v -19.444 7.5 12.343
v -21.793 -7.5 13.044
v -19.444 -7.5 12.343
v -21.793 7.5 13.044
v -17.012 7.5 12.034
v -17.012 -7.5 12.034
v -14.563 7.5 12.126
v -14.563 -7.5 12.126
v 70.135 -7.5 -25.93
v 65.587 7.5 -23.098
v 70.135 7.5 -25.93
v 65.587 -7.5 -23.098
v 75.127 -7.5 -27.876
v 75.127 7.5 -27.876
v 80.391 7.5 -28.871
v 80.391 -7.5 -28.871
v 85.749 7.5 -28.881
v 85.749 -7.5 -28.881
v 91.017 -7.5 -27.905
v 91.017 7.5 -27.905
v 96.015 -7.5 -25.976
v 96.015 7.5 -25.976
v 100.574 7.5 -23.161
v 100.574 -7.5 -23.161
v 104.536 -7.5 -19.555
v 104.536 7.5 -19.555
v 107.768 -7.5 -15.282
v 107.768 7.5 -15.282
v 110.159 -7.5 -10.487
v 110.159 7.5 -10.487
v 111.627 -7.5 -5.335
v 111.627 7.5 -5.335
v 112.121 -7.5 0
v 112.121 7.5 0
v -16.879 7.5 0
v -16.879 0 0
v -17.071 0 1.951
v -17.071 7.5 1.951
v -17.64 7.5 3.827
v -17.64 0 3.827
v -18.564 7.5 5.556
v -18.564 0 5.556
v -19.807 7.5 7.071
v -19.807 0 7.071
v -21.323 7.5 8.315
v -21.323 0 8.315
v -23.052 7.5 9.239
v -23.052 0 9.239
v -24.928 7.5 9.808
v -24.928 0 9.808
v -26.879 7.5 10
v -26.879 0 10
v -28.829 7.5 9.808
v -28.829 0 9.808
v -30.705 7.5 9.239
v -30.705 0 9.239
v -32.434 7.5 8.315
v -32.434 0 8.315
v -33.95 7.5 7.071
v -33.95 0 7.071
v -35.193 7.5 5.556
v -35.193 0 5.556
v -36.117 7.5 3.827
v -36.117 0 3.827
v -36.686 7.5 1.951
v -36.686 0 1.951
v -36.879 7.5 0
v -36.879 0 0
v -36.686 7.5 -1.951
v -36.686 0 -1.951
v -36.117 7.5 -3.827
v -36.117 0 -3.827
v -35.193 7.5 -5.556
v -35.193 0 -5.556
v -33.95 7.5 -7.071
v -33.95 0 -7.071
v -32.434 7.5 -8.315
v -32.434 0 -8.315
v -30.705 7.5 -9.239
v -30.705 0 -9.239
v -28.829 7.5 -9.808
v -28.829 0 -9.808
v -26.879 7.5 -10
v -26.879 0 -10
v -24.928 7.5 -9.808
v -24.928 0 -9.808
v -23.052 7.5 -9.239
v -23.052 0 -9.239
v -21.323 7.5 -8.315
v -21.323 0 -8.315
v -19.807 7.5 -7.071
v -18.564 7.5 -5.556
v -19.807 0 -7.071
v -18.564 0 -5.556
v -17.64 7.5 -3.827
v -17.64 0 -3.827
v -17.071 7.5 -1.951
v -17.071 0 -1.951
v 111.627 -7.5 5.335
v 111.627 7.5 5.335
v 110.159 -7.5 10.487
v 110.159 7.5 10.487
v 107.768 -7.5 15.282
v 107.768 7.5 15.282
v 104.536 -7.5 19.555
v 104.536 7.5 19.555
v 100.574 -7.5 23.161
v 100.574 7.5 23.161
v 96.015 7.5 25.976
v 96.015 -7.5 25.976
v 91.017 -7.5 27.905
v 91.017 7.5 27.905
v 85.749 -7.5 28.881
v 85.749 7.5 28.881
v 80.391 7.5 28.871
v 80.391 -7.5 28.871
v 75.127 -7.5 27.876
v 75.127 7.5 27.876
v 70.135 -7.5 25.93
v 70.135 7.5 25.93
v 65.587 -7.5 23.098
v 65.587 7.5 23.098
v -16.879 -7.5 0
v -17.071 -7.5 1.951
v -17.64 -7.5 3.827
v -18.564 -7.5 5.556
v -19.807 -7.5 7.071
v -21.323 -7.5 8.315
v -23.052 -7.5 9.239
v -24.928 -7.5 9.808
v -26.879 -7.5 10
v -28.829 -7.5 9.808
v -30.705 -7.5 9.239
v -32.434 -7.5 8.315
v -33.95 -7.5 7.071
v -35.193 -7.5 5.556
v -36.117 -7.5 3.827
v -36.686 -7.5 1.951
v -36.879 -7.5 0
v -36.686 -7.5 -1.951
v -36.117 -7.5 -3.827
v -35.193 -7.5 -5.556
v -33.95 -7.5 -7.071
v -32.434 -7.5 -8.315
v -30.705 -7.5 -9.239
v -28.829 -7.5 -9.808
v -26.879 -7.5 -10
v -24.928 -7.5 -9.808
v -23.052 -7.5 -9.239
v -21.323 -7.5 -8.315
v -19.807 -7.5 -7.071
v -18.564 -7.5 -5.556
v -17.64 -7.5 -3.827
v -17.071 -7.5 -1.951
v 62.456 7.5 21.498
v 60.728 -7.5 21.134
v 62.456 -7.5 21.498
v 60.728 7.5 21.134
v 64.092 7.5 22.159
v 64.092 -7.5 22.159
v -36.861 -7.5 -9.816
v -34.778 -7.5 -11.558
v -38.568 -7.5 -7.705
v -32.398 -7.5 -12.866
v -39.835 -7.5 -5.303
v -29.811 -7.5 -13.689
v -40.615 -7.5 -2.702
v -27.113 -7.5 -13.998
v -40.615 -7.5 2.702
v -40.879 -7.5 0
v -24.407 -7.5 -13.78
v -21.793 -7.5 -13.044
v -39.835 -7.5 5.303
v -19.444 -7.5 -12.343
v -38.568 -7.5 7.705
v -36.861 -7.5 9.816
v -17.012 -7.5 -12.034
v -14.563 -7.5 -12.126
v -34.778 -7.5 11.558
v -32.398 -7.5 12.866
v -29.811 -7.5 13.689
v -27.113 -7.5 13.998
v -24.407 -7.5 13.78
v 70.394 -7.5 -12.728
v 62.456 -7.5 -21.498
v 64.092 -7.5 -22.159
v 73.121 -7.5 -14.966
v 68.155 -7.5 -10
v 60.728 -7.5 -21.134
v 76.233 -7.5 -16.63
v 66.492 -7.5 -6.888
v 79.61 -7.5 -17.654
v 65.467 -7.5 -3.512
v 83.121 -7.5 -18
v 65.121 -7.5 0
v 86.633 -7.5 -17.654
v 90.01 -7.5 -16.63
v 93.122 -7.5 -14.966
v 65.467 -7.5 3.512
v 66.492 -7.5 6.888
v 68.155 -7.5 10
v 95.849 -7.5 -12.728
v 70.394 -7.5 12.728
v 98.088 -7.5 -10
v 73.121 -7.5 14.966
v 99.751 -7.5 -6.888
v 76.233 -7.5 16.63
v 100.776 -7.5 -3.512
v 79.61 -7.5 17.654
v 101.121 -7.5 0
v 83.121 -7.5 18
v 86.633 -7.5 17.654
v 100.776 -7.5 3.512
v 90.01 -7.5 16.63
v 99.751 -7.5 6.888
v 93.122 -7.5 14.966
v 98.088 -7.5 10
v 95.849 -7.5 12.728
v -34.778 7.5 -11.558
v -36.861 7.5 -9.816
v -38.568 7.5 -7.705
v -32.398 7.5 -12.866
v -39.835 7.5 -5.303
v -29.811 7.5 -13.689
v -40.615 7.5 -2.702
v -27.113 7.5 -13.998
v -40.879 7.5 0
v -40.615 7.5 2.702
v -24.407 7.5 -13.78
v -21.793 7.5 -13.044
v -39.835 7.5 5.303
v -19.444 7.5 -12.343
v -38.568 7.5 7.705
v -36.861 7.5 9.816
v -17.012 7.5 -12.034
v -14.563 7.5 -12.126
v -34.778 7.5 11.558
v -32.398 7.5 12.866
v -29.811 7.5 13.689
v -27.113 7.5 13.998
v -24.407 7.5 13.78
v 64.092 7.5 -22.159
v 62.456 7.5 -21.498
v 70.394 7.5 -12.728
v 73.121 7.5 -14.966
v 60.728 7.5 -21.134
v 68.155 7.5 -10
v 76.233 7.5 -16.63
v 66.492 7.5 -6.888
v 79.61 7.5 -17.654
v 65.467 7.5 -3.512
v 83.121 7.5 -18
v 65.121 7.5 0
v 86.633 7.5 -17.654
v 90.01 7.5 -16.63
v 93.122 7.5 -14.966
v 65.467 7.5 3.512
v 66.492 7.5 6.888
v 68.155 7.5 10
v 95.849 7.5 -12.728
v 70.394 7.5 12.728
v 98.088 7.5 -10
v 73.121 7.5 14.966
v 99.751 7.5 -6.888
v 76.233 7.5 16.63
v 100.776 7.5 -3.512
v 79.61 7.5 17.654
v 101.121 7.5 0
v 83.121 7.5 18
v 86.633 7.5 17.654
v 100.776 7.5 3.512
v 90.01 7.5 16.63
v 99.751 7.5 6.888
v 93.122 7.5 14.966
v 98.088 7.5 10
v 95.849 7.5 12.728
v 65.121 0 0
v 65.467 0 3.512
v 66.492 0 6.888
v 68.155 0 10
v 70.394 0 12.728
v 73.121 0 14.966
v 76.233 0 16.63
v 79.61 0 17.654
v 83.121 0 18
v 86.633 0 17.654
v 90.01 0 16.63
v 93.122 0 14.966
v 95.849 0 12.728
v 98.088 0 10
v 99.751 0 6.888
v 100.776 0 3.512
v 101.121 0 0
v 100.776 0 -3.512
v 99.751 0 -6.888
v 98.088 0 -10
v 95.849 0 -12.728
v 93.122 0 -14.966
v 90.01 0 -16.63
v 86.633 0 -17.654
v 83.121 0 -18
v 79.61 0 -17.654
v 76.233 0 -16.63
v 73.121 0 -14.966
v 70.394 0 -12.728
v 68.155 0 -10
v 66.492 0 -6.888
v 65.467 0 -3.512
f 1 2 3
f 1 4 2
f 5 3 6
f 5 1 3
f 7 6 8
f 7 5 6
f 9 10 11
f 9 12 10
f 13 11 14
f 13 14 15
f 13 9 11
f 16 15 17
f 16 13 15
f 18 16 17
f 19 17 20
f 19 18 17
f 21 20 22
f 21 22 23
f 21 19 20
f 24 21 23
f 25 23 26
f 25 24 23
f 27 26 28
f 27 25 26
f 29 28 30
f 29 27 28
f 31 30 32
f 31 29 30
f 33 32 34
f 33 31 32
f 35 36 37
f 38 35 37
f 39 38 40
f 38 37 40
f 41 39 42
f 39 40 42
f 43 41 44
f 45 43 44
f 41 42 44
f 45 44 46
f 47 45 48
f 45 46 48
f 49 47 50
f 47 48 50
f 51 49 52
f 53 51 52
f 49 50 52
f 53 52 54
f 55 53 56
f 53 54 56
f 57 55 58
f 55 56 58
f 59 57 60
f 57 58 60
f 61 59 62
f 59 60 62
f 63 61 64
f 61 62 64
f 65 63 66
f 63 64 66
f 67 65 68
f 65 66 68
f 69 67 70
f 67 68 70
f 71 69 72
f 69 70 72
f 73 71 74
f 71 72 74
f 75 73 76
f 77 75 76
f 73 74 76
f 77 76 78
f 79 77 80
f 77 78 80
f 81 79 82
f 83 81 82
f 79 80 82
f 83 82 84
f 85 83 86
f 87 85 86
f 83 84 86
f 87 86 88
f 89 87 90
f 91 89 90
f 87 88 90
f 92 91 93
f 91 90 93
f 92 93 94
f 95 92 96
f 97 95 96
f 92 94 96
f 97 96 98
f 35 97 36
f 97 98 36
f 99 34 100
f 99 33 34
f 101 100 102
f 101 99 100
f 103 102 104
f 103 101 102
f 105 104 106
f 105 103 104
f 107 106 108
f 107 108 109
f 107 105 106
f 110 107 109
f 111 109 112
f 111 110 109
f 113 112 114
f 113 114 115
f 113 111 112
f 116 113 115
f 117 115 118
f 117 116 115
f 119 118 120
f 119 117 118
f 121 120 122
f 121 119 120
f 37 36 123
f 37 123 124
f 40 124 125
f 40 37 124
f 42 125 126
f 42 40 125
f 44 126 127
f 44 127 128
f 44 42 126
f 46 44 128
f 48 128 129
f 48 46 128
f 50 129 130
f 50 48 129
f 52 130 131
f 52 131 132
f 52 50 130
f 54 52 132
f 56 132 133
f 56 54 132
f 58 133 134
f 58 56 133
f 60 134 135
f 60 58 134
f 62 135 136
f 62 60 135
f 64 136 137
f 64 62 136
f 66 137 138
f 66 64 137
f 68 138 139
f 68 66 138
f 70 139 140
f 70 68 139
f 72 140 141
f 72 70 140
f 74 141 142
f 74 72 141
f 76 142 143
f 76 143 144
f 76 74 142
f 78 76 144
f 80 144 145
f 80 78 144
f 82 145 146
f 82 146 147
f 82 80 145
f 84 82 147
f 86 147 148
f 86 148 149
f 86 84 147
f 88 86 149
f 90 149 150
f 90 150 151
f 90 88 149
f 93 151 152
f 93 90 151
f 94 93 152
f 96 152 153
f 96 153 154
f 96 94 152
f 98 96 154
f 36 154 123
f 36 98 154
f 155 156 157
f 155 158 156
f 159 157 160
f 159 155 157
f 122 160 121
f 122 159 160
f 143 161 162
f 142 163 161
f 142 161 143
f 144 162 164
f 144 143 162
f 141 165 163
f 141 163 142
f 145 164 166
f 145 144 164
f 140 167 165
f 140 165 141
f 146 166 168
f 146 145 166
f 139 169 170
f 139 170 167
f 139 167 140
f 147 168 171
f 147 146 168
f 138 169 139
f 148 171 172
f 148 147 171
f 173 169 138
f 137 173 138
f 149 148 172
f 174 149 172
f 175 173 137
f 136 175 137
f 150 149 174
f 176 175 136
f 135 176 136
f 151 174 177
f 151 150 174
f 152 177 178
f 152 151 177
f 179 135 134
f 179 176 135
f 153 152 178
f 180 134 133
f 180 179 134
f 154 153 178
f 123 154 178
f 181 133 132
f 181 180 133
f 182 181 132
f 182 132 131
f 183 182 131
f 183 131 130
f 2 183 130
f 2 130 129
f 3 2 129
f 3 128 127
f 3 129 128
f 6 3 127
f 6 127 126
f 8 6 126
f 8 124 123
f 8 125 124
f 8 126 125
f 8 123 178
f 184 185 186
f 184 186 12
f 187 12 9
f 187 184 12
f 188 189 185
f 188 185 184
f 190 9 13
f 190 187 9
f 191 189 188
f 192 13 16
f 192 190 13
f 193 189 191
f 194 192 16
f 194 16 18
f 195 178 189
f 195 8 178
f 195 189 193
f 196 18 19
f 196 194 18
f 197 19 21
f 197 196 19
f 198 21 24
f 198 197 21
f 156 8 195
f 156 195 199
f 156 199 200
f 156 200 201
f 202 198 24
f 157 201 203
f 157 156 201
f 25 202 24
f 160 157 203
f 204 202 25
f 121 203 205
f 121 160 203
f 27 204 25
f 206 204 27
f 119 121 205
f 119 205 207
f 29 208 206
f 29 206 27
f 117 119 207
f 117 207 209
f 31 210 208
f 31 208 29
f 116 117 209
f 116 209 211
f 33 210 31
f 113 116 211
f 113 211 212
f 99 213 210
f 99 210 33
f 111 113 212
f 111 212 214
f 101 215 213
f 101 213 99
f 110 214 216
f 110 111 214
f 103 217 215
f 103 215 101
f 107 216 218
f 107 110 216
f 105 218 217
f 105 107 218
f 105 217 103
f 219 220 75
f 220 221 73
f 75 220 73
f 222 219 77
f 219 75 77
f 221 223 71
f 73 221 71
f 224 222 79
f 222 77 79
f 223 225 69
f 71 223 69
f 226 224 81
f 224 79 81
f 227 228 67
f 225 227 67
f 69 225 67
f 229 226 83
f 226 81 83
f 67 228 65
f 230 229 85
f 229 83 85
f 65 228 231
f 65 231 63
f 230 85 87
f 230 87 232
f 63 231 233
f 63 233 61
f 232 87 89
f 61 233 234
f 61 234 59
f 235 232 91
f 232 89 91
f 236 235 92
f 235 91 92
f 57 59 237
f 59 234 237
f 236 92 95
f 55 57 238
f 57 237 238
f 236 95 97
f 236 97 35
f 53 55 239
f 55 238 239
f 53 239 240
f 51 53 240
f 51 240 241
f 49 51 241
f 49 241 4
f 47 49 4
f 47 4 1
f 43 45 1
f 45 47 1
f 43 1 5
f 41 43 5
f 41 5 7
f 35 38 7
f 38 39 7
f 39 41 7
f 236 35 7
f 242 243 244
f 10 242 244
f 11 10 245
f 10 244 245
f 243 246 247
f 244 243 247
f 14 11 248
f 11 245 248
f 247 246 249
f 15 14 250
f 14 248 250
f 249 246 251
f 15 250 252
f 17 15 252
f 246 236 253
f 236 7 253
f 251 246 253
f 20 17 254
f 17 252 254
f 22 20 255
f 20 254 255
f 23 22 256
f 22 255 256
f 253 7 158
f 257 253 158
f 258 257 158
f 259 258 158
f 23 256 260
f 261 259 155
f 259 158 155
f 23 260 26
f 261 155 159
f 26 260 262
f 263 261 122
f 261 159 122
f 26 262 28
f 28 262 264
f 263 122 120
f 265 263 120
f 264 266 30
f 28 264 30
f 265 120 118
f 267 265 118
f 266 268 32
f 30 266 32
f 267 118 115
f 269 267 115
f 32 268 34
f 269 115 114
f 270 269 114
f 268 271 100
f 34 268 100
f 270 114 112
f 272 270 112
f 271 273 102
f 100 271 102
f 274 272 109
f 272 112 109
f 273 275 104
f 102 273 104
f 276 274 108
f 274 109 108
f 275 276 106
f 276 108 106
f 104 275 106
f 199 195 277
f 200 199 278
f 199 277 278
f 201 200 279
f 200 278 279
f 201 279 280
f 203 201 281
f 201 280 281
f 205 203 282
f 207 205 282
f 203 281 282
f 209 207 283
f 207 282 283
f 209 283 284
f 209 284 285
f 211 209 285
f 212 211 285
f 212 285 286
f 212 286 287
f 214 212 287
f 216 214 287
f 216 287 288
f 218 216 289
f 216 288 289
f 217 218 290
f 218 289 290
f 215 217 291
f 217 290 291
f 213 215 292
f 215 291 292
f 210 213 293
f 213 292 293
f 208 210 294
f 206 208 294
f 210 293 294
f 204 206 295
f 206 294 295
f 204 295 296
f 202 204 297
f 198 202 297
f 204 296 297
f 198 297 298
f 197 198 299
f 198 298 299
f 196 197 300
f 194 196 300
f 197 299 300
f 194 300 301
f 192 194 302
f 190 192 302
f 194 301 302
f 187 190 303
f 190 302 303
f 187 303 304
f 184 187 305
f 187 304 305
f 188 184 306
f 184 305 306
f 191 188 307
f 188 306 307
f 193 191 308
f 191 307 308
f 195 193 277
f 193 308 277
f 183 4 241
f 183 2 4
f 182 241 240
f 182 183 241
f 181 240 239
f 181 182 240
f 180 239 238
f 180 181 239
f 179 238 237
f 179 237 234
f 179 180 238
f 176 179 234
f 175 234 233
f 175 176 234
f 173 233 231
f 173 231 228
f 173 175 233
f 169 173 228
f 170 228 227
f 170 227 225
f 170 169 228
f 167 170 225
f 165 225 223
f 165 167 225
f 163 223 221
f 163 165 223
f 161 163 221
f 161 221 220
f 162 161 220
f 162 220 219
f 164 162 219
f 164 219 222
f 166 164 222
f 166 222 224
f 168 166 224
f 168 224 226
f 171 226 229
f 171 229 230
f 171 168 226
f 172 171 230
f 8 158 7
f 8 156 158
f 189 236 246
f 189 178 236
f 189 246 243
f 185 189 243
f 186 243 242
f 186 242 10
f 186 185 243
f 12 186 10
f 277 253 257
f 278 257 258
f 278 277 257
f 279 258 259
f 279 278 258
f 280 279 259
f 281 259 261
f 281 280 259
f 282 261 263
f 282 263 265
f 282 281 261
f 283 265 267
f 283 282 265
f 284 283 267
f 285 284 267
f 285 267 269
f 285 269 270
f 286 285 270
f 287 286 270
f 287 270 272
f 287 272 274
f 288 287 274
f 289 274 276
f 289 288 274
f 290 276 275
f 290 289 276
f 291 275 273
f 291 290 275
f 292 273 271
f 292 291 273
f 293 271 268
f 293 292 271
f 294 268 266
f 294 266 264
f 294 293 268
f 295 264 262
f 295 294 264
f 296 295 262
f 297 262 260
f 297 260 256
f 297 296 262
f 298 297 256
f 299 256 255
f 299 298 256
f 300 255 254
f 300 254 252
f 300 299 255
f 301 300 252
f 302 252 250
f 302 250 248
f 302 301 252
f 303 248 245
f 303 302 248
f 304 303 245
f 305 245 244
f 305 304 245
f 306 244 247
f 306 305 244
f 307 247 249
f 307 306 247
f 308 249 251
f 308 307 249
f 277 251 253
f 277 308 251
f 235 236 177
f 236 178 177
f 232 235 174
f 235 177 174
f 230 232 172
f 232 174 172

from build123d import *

# Parameters (mm, degrees)
F0_R     = 10
F1_DEPTH = 7.5
F2_R     = 10
F3_R     = 10
F4_R     = 15
F5_R     = 15


with BuildPart() as f1:
    # F0 (on Front) → F1 (new body, symmetric)
    with BuildSketch(Plane.XZ):
        with BuildLine():
            ThreePointArc((-19.027325, -11.591323), (-14.510885, -6.560614), (-12.878518, 0))
            ThreePointArc((-12.878518, 0), (-14.510885, 6.560614), (-19.027325, 11.591323))
            ThreePointArc((-19.027325, 11.591323), (-40.878518, 0), (-19.027325, -11.591323))
        make_face()
        with Locations((-26.878518, 0)):
            Circle(F0_R, mode=Mode.SUBTRACT)
        with BuildLine():
            Line((54.121482, 0), (-12.878518, 0))
            ThreePointArc((-12.878518, 0), (-14.510885, -6.560614), (-19.027325, -11.591323))
            Line((-19.027325, -11.591323), (63.640685, -21.482518))
            ThreePointArc((63.640685, -21.482518), (56.607871, -11.748551), (54.121482, 0))
        make_face()
        with BuildLine():
            ThreePointArc((-19.027325, 11.591323), (-14.510885, 6.560614), (-12.878518, 0))
            Line((-12.878518, 0), (54.121482, 0))
            ThreePointArc((54.121482, 0), (56.607871, 11.748551), (63.640685, 21.482518))
            Line((63.640685, 21.482518), (-19.027325, 11.591323))
        make_face()
        with BuildLine():
            ThreePointArc((63.640685, 21.482518), (56.607871, 11.748551), (54.121482, 0))
            ThreePointArc((54.121482, 0), (56.607871, -11.748551), (63.640685, -21.482518))
            ThreePointArc((63.640685, -21.482518), (94.870033, -26.513611), (112.121482, 0))
            ThreePointArc((112.121482, 0), (94.870033, 26.513611), (63.640685, 21.482518))
        make_face()
        with BuildLine():
            ThreePointArc((101.121482, 0), (83.121482, -18), (65.121482, 0))
            ThreePointArc((65.121482, 0), (83.121482, 18), (101.121482, 0))
        make_face(mode=Mode.SUBTRACT)
    extrude(amount=F1_DEPTH, both=True)

    # F2
    f2_edges = [f1.edges().sort_by_distance(p)[0] for p in [
        (63.640685, -3.75, 21.482518),
    ]]
    fillet(f2_edges, radius=F2_R)

    # F3
    f3_edges = [f1.edges().sort_by_distance(p)[0] for p in [
        (63.640685, 3.75, -21.482518),
    ]]
    fillet(f3_edges, radius=F3_R)

    # F4
    f4_edges = [f1.edges().sort_by_distance(p)[0] for p in [
        (-19.027325, 0, -11.591323),
    ]]
    fillet(f4_edges, radius=F4_R)

    # F5
    f5_edges = [f1.edges().sort_by_distance(p)[0] for p in [
        (-19.027325, 0, 11.591323),
    ]]
    fillet(f5_edges, radius=F5_R)


solid = f1.part
